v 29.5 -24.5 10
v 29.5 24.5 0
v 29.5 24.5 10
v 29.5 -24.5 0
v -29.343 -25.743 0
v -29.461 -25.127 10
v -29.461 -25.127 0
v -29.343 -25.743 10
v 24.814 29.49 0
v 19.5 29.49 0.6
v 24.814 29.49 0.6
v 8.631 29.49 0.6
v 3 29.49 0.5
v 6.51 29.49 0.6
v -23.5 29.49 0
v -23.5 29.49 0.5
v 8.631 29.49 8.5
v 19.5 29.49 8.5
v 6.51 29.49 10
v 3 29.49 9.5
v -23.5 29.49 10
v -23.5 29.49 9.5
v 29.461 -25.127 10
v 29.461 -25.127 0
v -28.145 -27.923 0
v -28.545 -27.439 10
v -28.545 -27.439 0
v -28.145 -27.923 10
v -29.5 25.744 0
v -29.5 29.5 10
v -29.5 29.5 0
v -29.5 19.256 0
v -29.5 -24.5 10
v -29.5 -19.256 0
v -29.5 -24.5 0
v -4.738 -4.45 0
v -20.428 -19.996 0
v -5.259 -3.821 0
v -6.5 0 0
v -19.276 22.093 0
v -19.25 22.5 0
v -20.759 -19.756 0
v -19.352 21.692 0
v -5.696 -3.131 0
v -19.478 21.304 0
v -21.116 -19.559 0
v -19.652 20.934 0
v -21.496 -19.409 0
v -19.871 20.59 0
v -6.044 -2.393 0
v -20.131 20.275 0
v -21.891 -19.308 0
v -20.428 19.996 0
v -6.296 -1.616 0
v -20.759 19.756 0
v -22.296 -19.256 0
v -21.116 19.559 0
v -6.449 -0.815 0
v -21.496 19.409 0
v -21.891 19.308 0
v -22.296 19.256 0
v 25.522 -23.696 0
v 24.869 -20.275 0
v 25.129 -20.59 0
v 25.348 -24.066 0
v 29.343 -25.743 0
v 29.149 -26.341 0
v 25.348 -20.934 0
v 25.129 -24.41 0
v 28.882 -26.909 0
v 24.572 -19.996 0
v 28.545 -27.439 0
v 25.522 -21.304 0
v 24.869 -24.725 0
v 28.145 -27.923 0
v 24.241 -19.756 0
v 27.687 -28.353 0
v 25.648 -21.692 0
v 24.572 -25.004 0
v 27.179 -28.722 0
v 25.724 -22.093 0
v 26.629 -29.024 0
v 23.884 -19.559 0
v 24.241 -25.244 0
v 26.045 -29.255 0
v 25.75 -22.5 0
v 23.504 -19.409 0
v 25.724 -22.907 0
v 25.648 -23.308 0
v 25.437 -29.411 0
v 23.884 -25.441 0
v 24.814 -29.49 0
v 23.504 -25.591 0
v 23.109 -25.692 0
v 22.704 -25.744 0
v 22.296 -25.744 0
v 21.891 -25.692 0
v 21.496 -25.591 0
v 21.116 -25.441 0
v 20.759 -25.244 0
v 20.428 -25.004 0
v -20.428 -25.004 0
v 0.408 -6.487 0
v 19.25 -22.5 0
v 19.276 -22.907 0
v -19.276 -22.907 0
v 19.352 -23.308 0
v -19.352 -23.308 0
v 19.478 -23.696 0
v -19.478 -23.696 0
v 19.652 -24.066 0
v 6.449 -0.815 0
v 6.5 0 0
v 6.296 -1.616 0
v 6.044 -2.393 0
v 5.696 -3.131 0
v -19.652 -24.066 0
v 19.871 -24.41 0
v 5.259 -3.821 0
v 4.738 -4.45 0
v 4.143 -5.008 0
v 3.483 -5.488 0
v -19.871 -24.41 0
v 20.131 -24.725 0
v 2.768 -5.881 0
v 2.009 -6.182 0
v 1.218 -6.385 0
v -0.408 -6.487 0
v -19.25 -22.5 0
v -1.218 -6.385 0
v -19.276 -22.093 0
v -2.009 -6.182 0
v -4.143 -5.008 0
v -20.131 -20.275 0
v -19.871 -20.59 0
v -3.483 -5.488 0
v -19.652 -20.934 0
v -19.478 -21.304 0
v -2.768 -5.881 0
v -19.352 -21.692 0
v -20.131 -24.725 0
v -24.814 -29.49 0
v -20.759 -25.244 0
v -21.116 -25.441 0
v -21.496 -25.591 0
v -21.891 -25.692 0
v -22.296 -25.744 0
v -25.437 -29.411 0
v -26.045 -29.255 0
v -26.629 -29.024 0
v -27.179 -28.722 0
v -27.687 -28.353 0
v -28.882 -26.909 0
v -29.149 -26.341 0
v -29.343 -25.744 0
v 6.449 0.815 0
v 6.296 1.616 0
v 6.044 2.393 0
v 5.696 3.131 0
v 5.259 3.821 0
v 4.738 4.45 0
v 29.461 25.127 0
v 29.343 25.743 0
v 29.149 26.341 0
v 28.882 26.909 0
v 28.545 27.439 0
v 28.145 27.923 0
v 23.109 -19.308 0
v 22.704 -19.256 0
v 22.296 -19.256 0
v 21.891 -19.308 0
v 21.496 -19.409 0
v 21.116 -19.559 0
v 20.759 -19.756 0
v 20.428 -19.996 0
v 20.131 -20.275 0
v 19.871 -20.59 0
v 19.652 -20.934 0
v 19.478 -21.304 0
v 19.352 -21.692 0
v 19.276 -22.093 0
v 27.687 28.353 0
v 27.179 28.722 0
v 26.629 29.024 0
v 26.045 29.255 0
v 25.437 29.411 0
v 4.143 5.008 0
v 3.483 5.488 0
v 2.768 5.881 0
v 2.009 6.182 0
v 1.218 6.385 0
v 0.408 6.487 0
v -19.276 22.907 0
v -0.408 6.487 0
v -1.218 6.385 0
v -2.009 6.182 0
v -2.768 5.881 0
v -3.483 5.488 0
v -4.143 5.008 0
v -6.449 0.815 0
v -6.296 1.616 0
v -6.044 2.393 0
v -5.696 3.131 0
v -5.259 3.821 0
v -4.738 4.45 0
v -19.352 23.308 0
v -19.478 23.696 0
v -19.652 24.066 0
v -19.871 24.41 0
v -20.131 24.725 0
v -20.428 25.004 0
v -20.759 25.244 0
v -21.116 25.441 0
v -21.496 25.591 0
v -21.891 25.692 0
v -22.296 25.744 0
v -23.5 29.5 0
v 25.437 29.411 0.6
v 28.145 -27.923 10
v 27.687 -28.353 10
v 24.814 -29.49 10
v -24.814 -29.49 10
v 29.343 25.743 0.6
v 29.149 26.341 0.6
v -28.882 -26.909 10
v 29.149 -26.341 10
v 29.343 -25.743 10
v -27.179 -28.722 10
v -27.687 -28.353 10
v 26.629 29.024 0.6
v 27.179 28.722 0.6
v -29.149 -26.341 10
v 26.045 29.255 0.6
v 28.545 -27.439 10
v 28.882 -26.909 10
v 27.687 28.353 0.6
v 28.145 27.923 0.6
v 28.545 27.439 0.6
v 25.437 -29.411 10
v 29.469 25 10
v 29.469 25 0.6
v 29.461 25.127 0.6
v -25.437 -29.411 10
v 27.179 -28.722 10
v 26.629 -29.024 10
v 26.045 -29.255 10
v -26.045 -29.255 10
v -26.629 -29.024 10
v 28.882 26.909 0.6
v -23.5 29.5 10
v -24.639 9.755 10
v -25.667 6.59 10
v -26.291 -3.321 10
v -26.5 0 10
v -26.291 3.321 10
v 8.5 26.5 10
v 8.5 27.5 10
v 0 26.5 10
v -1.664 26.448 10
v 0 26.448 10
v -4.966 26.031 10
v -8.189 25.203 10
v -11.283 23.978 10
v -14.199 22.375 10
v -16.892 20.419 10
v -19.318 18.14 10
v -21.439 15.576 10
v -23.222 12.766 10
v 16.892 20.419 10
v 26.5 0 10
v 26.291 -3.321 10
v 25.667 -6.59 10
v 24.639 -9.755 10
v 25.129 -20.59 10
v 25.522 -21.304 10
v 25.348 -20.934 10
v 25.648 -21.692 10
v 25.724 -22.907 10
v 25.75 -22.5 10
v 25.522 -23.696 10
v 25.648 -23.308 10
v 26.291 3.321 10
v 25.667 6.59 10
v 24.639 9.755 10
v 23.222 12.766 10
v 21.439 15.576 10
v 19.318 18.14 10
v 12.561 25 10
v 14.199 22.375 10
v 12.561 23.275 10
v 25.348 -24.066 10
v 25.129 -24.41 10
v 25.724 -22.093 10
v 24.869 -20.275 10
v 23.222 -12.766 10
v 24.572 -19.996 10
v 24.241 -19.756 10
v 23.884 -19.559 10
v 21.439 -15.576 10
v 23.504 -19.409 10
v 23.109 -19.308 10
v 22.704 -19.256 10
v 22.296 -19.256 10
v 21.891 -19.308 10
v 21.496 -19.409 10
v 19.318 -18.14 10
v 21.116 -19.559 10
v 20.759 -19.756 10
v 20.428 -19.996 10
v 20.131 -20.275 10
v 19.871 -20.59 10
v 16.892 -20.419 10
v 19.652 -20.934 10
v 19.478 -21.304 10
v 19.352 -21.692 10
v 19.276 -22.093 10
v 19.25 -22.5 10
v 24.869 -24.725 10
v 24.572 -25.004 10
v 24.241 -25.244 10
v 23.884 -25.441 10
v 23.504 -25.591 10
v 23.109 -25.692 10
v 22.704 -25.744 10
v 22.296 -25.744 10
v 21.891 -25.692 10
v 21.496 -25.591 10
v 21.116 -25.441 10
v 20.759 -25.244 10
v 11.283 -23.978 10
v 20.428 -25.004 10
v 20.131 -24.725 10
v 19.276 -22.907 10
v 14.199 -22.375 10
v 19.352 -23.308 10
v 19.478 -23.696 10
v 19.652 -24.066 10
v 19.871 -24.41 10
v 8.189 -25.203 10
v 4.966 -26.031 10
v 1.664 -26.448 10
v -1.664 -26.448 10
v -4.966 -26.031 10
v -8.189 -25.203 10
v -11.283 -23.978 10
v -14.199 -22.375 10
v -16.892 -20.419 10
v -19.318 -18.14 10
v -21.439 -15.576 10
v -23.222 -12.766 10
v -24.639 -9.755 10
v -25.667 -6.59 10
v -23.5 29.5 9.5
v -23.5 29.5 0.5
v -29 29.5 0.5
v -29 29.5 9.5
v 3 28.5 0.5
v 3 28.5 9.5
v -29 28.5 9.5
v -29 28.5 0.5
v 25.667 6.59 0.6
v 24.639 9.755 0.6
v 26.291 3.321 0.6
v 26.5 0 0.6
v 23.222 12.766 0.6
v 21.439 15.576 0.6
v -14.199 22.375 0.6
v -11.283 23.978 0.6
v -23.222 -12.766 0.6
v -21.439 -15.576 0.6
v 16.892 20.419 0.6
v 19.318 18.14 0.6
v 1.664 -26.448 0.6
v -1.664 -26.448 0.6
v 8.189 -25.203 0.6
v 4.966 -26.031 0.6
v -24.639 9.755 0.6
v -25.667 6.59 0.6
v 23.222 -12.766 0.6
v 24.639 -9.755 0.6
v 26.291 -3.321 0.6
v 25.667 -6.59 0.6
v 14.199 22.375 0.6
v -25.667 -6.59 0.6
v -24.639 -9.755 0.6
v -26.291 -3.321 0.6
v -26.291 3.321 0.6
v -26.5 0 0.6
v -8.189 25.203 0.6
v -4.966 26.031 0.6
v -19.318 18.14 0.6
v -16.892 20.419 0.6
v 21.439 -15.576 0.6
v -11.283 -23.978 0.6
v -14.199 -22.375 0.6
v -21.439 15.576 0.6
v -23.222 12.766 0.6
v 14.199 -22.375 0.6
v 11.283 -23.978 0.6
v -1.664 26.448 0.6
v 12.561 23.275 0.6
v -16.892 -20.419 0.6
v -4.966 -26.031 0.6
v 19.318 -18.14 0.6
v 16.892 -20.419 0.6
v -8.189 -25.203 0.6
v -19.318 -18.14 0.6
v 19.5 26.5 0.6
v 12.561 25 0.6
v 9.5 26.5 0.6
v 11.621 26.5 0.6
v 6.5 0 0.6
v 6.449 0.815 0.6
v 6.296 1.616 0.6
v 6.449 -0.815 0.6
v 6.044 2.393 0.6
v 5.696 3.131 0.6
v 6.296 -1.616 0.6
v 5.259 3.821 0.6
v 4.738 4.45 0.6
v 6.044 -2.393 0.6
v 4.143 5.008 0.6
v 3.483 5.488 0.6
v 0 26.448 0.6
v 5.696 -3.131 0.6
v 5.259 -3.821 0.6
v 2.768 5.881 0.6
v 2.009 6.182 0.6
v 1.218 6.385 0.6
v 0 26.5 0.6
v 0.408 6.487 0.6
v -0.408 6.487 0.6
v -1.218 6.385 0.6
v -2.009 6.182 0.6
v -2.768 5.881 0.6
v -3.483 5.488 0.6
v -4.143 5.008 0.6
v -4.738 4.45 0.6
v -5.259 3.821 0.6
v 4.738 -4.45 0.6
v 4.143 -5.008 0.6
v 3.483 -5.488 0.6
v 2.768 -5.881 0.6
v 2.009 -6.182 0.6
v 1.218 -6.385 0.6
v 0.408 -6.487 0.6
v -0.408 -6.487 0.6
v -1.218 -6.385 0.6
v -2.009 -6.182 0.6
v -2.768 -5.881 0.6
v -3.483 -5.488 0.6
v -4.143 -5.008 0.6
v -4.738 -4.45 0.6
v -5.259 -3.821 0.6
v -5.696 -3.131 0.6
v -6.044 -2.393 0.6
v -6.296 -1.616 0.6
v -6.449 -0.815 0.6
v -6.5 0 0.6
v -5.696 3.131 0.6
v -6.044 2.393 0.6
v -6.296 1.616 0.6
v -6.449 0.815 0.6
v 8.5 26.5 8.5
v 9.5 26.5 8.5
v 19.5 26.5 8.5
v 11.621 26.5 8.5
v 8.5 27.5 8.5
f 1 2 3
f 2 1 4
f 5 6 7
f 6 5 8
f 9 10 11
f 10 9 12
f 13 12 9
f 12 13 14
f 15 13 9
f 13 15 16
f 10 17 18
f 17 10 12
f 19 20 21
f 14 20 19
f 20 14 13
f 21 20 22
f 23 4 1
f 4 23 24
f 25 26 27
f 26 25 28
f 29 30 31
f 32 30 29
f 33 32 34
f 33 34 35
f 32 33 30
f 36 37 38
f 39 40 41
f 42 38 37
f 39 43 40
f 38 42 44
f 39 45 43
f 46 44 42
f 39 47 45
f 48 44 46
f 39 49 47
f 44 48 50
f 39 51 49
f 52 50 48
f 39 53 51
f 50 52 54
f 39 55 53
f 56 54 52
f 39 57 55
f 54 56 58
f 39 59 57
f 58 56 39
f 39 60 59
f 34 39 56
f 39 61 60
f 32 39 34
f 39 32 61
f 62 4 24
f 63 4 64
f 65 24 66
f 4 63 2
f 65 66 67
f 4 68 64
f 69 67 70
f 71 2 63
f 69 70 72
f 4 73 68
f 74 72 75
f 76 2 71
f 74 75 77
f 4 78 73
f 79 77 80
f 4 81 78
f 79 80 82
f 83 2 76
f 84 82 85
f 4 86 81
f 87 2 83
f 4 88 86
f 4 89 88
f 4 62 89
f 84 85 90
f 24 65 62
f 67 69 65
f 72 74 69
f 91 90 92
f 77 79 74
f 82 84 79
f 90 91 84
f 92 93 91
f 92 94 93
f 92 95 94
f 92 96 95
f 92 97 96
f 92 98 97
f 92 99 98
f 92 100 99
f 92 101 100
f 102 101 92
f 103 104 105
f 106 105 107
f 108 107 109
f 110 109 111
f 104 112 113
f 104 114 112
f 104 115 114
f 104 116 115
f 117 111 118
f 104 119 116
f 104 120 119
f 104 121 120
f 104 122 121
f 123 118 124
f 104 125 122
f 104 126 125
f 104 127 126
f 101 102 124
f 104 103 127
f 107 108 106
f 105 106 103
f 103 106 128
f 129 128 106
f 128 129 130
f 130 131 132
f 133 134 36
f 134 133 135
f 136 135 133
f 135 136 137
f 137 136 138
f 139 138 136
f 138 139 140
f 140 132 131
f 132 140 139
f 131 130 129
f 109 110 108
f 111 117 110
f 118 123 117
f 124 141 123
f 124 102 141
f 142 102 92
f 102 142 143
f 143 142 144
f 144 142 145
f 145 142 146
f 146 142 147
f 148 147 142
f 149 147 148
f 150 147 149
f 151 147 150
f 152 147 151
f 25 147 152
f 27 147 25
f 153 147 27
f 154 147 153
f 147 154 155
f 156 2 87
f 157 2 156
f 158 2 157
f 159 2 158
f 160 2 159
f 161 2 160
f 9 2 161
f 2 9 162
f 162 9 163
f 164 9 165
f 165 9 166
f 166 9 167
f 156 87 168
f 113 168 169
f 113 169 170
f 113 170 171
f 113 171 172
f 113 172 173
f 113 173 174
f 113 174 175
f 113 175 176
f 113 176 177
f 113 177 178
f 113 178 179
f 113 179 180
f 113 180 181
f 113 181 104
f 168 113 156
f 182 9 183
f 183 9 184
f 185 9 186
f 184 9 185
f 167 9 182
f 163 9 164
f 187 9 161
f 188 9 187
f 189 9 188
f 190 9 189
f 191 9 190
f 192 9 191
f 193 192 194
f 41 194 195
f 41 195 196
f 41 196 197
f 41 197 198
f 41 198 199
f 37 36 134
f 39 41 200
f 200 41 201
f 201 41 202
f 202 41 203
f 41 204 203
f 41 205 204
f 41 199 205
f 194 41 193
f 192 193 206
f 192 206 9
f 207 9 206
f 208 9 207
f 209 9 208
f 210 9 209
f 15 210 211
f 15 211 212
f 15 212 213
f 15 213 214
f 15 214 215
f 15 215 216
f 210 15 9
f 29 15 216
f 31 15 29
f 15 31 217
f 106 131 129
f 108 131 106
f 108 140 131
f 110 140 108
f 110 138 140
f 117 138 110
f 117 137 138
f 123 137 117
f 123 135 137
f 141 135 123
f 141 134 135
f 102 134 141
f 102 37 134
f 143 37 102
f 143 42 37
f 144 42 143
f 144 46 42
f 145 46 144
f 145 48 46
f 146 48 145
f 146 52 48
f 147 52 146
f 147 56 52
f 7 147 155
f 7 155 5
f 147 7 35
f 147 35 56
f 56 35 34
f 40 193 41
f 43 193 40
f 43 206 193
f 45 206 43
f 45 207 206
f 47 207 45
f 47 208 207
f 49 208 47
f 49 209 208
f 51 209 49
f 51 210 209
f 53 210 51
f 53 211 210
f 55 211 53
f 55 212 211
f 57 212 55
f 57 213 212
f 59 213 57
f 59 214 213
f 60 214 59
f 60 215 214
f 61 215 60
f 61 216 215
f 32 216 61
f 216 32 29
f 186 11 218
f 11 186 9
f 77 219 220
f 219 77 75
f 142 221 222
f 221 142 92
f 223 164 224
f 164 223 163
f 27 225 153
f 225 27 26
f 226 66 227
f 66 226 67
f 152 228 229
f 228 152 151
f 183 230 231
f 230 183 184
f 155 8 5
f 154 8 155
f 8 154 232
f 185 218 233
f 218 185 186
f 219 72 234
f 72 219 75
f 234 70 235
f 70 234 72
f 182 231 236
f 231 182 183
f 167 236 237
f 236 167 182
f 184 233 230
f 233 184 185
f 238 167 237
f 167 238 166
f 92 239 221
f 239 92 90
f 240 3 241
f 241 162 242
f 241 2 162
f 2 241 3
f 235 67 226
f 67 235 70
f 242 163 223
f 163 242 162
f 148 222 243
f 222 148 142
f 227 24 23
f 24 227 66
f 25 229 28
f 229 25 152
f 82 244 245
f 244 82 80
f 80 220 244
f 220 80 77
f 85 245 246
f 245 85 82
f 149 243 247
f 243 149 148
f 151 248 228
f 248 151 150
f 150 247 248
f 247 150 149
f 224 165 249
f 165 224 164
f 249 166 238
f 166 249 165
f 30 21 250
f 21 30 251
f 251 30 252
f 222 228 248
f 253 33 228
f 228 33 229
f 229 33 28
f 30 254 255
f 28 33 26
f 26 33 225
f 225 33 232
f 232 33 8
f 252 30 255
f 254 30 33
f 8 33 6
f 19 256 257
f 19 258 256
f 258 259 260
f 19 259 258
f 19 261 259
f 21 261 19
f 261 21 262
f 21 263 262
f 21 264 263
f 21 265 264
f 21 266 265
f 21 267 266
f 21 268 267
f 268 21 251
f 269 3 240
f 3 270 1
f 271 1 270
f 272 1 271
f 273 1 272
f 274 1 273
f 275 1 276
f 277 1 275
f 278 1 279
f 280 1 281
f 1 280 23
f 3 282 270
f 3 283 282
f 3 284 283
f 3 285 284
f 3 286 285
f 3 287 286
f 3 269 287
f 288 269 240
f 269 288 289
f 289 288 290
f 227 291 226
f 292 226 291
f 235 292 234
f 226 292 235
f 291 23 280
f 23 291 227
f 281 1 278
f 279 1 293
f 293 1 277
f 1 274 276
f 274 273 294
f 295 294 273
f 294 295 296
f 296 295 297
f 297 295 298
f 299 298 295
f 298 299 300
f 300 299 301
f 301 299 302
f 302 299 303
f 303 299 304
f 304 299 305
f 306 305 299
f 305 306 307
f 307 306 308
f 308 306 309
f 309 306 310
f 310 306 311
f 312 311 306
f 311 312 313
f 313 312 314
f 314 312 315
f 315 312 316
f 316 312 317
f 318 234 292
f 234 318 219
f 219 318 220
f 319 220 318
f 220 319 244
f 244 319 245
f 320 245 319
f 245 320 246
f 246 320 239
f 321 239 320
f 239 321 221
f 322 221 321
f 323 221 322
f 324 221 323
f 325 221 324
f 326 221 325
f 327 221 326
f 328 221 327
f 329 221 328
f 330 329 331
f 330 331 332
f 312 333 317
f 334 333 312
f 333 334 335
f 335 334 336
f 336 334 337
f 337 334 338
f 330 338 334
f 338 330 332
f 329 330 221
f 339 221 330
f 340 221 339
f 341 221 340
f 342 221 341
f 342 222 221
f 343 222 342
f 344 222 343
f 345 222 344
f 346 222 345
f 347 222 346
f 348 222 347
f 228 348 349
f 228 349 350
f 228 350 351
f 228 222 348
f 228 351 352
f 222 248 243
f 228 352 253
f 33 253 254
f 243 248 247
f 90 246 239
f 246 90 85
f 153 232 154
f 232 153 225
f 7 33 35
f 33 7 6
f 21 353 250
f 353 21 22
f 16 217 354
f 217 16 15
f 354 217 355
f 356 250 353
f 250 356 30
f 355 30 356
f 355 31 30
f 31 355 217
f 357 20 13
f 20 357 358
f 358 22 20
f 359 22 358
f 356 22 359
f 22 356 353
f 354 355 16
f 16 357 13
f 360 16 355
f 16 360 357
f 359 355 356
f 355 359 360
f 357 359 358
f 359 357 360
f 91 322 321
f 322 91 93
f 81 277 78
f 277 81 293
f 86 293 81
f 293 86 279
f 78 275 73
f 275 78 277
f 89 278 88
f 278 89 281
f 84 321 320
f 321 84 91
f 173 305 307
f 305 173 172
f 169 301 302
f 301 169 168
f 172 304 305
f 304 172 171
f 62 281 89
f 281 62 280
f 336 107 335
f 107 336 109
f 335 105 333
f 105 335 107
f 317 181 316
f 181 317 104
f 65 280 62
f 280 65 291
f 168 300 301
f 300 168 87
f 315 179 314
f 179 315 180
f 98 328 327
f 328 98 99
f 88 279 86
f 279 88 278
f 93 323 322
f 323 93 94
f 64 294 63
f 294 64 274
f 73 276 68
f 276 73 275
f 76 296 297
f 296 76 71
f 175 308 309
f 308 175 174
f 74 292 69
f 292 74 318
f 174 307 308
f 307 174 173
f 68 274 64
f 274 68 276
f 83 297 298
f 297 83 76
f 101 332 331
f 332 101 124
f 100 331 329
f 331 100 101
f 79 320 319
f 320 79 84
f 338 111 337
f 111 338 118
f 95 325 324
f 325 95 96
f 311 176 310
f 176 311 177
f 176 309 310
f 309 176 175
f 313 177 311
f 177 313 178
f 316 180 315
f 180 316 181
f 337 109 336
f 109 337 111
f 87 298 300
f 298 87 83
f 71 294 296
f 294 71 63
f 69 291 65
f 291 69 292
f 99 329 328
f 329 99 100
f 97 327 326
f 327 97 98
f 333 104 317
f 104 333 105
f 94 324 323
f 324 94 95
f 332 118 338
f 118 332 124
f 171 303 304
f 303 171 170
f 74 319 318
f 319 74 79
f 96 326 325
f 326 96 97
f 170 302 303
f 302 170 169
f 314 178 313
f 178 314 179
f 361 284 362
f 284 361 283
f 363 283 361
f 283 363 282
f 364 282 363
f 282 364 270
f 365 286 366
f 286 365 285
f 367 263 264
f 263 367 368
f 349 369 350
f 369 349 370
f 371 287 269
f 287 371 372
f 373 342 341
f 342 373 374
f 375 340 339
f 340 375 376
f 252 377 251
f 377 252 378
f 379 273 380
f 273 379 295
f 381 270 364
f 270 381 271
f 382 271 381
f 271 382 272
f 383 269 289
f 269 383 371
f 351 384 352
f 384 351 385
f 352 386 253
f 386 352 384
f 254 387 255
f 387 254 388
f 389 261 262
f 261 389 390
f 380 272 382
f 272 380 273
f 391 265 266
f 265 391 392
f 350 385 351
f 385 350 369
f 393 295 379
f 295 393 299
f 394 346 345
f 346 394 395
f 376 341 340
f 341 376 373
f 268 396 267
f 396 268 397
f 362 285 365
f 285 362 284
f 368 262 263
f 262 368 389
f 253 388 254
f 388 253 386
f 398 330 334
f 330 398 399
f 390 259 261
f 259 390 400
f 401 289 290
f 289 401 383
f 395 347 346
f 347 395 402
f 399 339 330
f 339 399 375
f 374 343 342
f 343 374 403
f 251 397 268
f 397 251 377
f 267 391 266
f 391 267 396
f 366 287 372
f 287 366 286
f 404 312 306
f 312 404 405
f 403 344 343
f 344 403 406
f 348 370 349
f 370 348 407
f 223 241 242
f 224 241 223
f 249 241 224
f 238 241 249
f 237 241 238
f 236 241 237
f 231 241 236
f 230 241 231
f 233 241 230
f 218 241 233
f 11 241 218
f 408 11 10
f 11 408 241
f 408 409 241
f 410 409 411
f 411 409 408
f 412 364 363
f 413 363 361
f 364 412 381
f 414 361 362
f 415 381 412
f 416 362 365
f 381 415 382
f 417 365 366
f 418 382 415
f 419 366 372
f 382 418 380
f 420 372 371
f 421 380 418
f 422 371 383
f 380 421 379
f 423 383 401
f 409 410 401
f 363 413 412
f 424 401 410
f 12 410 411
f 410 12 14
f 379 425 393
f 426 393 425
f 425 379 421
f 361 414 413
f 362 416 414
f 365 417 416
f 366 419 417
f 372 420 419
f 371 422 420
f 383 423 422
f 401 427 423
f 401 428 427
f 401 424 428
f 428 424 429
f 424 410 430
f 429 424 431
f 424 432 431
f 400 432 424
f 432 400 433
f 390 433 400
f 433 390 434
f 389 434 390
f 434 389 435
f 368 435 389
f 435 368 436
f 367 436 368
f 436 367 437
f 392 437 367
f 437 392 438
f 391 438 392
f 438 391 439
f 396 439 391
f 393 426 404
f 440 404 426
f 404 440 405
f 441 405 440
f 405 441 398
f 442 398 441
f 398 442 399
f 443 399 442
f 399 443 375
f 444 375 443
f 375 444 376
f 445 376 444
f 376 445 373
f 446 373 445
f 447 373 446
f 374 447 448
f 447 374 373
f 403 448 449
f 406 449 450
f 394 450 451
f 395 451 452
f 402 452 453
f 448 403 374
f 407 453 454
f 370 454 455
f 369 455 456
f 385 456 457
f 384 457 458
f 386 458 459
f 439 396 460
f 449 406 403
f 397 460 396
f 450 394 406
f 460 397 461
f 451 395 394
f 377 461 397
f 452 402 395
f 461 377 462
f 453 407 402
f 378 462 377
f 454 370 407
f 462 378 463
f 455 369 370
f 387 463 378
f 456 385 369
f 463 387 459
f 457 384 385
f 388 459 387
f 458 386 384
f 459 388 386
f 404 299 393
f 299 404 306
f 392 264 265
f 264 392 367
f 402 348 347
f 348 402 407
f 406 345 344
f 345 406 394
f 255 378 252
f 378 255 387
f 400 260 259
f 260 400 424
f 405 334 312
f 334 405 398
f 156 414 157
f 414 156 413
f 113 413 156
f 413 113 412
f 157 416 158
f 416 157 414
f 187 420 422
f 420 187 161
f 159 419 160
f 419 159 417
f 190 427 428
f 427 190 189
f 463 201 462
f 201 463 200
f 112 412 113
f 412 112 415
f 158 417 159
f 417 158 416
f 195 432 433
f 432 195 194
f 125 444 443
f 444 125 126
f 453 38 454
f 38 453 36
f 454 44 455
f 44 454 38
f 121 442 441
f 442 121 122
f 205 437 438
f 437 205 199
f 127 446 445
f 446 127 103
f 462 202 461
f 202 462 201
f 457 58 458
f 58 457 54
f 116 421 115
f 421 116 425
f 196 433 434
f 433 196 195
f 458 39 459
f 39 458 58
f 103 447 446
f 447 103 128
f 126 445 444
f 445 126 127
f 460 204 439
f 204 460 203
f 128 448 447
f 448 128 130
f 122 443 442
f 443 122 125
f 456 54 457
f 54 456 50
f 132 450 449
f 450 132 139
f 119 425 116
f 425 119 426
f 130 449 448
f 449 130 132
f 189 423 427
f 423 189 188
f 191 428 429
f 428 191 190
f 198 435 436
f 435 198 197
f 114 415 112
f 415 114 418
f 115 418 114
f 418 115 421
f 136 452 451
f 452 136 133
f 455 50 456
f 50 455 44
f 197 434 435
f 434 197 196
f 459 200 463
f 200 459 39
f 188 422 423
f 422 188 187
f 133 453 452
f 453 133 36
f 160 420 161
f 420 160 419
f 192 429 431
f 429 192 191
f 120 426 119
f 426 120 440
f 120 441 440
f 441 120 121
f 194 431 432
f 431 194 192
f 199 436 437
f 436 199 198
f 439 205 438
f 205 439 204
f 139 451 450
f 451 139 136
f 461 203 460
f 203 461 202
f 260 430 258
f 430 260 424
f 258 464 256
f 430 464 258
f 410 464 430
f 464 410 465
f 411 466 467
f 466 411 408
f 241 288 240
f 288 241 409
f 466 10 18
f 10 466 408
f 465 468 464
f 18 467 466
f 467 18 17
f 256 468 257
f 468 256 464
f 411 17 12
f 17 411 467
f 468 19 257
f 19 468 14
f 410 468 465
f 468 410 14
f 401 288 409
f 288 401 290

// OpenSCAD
$fn = 50;


difference() {
	union() {
		hull() {
			translate(v = [-24.5000000000, 24.5000000000, 0]) {
				cylinder(h = 10, r = 5);
			}
			translate(v = [24.5000000000, 24.5000000000, 0]) {
				cylinder(h = 10, r = 5);
			}
			translate(v = [-24.5000000000, -24.5000000000, 0]) {
				cylinder(h = 10, r = 5);
			}
			translate(v = [24.5000000000, -24.5000000000, 0]) {
				cylinder(h = 10, r = 5);
			}
		}
		translate(v = [-29.5000000000, 23.5000000000, 0]) {
			cube(size = [6, 6, 10]);
		}
	}
	union() {
		translate(v = [-30.0000000000, -22.5000000000, -250.0000000000]) {
			rotate(a = [0, 0, 0]) {
				difference() {
					union() {
						hull() {
							translate(v = [7.5000000000, 0, 0]) {
								cylinder(h = 250, r = 3.2500000000, r1 = 3.2500000000, r2 = 3.2500000000);
							}
							translate(v = [-7.5000000000, 0, 0]) {
								cylinder(h = 250, r = 3.2500000000, r1 = 3.2500000000, r2 = 3.2500000000);
							}
						}
					}
					union();
				}
			}
		}
		translate(v = [-30.0000000000, 22.5000000000, -250.0000000000]) {
			rotate(a = [0, 0, 0]) {
				difference() {
					union() {
						hull() {
							translate(v = [7.5000000000, 0, 0]) {
								cylinder(h = 250, r = 3.2500000000, r1 = 3.2500000000, r2 = 3.2500000000);
							}
							translate(v = [-7.5000000000, 0, 0]) {
								cylinder(h = 250, r = 3.2500000000, r1 = 3.2500000000, r2 = 3.2500000000);
							}
						}
					}
					union();
				}
			}
		}
		translate(v = [-29.0000000000, 28.5000000000, 0.5000000000]) {
			cube(size = [32, 1, 9.0000000000]);
		}
		translate(v = [22.5000000000, -22.5000000000, -50.0000000000]) {
			cylinder(h = 100, r = 3.2500000000);
		}
		translate(v = [0, 0, 0.6000000000]) {
			cylinder(h = 12.4000000000, r = 26.5000000000);
		}
		translate(v = [0, 0, -5.0000000000]) {
			cylinder(h = 10, r = 6.5000000000);
		}
		translate(v = [0.0000000000, 25.0000000000, 0.6000000000]) {
			cube(size = [29.5000000000, 1.5000000000, 12.4000000000]);
		}
		translate(v = [19.5000000000, 25.0000000000, 0.6000000000]) {
			cube(size = [10, 4.5000000000, 12.4000000000]);
		}
		translate(v = [8.5000000000, 25.0000000000, 8.5000000000]) {
			cube(size = [21, 4.5000000000, 1.5000000000]);
		}
		translate(v = [5.7500000000, 30.2500000000, 0.6000000000]) {
			rotate(a = [0, 0, -45]) {
				cube(size = [7.5000000000, 1.5000000000, 12.4000000000]);
			}
		}
		translate(v = [5.0610000000, 23.0000000000, 0.6000000000]) {
			cube(size = [7.5000000000, 2, 9.4000000000]);
		}
	}
}
